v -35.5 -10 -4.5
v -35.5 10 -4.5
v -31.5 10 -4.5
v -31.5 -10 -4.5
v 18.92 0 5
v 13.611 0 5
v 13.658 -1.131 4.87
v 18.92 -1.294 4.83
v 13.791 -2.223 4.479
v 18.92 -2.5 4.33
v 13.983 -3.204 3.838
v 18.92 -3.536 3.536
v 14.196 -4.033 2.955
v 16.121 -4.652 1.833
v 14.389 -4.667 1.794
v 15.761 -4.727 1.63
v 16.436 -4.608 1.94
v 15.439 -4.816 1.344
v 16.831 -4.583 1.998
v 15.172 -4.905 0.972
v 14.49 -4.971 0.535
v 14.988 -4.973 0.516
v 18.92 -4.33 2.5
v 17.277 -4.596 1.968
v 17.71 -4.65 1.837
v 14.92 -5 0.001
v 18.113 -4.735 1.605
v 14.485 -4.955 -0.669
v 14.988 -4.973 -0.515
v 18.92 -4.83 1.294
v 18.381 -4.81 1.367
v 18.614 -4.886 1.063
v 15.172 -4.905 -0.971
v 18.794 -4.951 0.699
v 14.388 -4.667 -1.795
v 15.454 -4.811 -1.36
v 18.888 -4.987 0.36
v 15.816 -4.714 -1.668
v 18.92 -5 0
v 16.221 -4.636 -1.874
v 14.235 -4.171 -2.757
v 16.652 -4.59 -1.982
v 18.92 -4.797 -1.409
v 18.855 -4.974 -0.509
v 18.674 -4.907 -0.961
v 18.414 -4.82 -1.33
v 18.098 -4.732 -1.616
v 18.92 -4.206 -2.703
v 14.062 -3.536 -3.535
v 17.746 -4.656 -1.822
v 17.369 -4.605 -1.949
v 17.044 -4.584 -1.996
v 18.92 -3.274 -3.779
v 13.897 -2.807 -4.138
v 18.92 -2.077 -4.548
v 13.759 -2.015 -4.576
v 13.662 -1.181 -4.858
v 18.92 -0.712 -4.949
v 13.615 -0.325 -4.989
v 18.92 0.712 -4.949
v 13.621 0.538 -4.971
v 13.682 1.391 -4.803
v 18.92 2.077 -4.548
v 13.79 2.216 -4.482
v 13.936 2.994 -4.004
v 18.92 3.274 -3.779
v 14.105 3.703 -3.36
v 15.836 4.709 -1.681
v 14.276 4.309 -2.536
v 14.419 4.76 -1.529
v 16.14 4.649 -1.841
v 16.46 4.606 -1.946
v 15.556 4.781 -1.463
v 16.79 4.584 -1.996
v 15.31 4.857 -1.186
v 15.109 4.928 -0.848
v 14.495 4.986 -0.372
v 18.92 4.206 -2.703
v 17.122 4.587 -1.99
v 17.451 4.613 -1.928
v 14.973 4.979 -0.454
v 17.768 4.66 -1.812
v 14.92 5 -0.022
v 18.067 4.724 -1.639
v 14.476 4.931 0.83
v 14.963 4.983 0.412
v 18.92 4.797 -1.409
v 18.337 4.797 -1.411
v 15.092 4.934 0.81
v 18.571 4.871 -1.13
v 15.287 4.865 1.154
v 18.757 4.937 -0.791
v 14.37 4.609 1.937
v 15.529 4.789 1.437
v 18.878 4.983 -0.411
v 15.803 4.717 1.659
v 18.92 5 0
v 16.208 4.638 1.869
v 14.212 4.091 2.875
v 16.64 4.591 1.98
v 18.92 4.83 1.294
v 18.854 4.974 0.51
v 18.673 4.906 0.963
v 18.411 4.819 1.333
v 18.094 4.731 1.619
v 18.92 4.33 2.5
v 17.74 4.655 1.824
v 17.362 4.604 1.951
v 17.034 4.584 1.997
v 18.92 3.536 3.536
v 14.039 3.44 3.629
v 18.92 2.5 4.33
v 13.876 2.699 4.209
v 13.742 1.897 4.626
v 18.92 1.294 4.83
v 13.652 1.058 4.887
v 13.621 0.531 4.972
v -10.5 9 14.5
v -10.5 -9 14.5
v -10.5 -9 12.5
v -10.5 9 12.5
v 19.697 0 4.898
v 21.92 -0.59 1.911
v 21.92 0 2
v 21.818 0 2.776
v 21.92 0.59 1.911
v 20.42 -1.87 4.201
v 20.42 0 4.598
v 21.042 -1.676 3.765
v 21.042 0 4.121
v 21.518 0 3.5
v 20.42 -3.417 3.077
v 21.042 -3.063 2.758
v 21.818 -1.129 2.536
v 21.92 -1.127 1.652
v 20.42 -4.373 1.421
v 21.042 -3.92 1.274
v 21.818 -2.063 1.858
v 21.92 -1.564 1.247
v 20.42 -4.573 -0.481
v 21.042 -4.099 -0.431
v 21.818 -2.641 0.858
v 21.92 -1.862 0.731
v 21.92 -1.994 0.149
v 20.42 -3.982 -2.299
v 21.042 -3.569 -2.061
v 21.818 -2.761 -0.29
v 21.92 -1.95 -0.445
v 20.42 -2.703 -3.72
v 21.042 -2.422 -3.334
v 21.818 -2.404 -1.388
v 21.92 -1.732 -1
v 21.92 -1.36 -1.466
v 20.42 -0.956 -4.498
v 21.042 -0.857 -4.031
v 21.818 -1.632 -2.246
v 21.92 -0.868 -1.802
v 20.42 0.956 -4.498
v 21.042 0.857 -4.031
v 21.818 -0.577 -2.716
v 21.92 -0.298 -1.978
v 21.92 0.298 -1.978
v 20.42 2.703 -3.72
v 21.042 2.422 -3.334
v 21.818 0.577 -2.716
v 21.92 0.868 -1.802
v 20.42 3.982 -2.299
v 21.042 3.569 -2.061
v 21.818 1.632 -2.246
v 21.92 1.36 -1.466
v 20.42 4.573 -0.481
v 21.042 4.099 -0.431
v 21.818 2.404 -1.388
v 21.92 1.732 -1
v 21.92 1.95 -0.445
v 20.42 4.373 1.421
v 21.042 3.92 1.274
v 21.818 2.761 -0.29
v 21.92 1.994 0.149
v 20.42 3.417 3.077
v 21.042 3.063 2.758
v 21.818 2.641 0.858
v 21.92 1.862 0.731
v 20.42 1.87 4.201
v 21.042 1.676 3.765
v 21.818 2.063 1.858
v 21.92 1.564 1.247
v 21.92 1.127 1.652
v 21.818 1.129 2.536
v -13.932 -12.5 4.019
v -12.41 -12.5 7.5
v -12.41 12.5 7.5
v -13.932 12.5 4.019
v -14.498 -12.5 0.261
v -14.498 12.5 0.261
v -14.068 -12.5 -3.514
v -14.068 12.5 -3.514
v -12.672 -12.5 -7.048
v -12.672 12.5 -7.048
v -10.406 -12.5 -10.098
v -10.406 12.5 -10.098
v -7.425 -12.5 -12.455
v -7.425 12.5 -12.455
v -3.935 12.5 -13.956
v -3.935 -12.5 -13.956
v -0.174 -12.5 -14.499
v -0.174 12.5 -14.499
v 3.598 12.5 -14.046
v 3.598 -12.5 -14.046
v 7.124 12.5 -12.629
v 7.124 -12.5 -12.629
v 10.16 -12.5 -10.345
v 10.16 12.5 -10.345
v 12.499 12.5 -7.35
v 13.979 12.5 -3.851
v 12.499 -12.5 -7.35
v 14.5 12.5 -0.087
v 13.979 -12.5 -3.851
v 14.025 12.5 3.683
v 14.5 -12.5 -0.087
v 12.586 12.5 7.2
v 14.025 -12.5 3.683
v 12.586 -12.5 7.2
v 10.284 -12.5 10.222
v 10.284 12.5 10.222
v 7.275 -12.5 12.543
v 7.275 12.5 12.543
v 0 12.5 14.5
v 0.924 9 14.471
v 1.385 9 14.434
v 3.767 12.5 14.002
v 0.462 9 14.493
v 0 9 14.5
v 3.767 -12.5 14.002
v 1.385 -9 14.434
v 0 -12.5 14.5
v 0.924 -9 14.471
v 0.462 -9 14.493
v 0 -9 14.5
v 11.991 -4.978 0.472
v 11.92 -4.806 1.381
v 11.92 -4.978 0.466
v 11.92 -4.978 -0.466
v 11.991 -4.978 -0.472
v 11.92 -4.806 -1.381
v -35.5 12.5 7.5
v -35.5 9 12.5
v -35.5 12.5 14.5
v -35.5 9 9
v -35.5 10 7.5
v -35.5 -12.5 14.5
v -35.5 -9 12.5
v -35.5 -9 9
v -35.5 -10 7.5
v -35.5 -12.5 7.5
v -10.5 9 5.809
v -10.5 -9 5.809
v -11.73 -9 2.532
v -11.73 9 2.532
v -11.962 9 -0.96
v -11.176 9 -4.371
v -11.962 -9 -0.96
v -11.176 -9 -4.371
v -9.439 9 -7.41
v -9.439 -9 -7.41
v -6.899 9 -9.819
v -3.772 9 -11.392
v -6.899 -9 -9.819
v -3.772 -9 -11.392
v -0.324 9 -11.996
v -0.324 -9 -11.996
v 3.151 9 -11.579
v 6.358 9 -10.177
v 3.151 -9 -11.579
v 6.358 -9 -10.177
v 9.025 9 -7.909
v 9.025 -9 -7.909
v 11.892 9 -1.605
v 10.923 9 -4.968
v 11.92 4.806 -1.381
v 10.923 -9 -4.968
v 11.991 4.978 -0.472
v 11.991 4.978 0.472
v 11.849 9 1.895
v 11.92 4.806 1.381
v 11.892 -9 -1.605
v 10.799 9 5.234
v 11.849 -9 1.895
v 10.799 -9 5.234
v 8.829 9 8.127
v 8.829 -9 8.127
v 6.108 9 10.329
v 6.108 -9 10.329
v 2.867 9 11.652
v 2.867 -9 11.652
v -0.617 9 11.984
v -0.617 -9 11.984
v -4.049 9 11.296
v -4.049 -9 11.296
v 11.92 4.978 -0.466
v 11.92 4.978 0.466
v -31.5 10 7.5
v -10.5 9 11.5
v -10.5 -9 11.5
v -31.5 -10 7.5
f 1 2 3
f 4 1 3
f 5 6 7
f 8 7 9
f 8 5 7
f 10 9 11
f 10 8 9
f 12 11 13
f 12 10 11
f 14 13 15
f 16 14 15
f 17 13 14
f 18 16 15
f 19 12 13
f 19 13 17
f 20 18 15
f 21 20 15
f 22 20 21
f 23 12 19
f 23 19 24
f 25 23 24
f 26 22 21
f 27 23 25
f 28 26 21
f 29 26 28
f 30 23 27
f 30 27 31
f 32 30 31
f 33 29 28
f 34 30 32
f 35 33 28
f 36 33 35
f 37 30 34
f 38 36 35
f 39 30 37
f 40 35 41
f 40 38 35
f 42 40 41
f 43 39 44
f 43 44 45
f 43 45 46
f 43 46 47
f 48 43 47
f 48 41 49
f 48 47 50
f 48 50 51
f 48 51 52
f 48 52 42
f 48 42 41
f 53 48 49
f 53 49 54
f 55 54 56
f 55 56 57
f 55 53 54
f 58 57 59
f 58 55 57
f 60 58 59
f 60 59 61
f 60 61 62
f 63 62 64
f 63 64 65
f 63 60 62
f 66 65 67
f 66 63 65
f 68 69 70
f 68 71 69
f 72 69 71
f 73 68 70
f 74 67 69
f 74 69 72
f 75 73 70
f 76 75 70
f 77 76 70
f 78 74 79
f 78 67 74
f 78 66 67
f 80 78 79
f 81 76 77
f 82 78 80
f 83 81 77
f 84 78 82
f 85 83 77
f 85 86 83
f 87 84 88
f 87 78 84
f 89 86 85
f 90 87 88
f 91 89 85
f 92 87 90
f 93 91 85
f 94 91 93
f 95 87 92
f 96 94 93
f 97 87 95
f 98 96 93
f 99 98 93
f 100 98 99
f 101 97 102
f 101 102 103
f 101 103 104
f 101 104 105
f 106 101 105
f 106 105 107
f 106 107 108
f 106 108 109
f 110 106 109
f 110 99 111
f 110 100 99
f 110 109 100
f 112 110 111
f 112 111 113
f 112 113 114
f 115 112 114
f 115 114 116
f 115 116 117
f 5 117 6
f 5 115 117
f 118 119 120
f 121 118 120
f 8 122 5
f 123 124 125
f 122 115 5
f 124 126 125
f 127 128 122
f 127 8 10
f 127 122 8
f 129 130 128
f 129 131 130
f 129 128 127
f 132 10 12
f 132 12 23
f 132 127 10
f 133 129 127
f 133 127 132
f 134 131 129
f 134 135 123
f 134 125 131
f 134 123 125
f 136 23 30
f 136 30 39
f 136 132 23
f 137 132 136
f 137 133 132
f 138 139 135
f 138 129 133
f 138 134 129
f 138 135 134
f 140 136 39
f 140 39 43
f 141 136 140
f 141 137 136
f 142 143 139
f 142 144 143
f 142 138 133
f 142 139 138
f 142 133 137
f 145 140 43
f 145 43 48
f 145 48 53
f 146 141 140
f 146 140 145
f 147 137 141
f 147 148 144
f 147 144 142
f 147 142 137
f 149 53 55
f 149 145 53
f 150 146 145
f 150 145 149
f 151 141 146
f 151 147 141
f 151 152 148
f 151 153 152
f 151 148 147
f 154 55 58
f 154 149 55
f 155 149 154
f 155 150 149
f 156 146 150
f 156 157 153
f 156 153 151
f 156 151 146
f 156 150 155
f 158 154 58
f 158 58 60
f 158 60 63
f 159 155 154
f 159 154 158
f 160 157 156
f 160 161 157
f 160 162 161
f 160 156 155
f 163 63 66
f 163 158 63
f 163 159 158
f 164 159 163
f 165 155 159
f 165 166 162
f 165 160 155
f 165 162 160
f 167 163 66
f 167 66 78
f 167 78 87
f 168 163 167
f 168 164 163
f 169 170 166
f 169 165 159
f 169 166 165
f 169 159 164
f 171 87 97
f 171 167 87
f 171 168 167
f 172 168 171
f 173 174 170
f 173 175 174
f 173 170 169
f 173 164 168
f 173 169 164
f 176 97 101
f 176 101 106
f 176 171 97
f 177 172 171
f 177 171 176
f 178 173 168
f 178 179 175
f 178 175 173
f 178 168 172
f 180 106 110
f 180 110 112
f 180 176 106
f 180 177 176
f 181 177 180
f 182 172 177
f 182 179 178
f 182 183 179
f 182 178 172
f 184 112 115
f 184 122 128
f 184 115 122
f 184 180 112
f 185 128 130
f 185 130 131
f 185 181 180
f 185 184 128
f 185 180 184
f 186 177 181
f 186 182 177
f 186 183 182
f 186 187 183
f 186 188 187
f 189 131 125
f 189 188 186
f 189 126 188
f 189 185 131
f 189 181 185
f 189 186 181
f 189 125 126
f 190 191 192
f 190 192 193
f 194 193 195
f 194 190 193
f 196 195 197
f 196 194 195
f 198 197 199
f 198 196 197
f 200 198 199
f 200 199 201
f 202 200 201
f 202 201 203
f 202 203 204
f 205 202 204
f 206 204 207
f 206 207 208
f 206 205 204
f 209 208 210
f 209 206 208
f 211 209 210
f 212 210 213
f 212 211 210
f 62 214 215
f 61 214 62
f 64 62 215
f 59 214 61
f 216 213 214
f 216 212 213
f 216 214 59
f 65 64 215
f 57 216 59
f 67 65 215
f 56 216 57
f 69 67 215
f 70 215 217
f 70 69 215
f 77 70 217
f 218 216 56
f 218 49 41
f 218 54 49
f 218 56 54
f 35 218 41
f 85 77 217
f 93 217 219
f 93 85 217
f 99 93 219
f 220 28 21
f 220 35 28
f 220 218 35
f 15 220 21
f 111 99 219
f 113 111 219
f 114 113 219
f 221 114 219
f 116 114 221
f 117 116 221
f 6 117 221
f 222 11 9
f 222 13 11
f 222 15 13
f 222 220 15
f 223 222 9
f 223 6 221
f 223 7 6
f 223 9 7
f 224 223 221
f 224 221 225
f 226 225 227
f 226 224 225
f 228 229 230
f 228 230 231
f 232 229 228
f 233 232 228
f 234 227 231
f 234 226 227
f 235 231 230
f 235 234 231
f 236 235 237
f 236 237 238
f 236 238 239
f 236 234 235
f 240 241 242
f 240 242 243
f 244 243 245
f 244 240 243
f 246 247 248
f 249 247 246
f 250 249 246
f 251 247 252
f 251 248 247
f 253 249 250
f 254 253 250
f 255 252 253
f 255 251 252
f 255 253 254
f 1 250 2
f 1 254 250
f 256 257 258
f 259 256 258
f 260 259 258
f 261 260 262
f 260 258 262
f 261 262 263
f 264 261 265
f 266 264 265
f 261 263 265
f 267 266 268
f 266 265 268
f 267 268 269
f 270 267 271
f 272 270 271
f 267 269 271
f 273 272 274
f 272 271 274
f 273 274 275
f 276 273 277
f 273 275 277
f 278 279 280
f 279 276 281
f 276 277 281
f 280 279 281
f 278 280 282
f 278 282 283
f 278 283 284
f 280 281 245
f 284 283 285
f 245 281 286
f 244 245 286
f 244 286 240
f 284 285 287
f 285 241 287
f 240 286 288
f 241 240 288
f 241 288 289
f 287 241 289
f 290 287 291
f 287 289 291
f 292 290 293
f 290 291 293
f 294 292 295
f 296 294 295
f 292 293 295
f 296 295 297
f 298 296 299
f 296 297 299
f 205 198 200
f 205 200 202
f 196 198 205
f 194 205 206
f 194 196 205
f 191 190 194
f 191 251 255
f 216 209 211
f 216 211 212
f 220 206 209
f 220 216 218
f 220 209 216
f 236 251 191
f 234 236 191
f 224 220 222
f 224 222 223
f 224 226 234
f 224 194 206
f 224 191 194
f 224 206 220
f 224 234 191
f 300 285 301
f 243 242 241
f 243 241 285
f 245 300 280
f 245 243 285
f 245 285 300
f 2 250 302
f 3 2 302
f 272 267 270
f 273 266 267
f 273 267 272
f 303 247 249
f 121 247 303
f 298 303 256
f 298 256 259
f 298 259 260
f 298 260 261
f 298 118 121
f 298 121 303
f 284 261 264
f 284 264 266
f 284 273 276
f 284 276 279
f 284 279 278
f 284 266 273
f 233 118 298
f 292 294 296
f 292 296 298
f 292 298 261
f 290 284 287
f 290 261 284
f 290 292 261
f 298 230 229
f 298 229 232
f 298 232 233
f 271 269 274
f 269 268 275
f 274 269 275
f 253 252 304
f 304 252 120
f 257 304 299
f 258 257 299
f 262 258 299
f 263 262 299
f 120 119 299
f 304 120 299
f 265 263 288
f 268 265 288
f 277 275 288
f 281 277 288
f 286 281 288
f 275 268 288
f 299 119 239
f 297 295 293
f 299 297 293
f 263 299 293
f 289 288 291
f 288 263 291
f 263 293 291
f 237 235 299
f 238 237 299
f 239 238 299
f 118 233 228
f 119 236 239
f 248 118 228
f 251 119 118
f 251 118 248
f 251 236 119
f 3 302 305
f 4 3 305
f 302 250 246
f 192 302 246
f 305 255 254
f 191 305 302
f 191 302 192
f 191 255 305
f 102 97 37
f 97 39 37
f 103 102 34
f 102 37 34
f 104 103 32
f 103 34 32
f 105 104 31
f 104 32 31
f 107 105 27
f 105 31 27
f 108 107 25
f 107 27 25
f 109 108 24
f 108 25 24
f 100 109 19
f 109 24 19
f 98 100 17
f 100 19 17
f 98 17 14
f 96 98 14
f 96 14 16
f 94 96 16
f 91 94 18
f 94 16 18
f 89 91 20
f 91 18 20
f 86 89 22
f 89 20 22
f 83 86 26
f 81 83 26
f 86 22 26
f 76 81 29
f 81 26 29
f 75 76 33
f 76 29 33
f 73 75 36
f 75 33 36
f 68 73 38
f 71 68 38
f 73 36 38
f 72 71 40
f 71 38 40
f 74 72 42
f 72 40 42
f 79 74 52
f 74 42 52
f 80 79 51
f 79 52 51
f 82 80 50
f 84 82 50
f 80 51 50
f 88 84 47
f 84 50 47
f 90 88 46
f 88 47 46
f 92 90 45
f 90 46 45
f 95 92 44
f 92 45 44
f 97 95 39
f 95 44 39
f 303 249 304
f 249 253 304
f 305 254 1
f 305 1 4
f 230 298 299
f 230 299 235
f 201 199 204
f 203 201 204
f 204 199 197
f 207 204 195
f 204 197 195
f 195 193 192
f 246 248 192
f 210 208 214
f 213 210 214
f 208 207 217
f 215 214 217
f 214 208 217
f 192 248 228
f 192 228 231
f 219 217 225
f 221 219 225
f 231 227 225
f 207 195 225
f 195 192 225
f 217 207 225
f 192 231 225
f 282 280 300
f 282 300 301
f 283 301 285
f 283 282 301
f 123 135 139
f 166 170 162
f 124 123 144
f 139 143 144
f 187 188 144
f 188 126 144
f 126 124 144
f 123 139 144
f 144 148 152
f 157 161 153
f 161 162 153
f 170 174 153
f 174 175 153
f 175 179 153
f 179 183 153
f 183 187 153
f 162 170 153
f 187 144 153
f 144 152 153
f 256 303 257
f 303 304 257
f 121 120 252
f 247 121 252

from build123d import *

# Parameters (mm, degrees)
F1_DEPTH  = 12.5
F3_DEPTH  = 9
F4_W      = 10
F4_H      = 5
F6_R      = 3
F7_R      = 2
F8_DEPTH  = 5
F9_W      = 4
F9_H      = 20
F10_DEPTH = 12
F11_DEPTH = 0.7


with BuildPart() as f1:
    # F0 (on Front) → F1 (new body, symmetric)
    with BuildSketch(Plane.XZ):
        with BuildLine():
            Line((-35.5, 7.5), (-12.409673646, 7.5))
            ThreePointArc((-12.409673646, 7.5), (7.1239034244, -12.6293309403), (0, 14.5))
            Line((0, 14.5), (-35.5, 14.5))
            Line((-35.5, 14.5), (-35.5, 7.5))
        make_face()
    extrude(amount=F1_DEPTH, both=True)

    # F2 (on Front) → F3 (cut, symmetric)
    with BuildSketch(Plane.XZ):
        with BuildLine():
            Line((-10.5, 11.5), (-10.5, 5.8094750193))
            ThreePointArc((-10.5, 5.8094750193), (7.7746445838, -9.1408370292), (-4.0490846521, 11.2962344823))
            Line((-4.0490846521, 11.2962344823), (1.5, 14.5))
            Line((1.5, 14.5), (-10.5, 14.5))
            Line((-10.5, 14.5), (-10.5, 12.5))
            Line((-10.5, 12.5), (-35.5, 12.5))
            Line((-35.5, 12.5), (-35.5, 9))
            Line((-35.5, 9), (-10.5, 11.5))
        make_face()
    extrude(amount=F3_DEPTH, both=True, mode=Mode.SUBTRACT)

    # F4 (on Front) → F5 (revolve)
    with BuildSketch(Plane.XZ):
        with Locations((16.9203263894, 2.5)):
            Rectangle(F4_W, F4_H)
    revolve(axis=Axis((16.9203263894, 0, 0), (1, 0, 0)))

    # F6
    f6_edges = [f1.edges().sort_by_distance(p)[0] for p in [
        (21.920326, 0, -5),
    ]]
    fillet(f6_edges, radius=F6_R)

    # F7 (on Front) → F8 (cut, symmetric)
    with BuildSketch(Plane.XZ):
        with Locations((16.9203263894, 0)):
            Circle(F7_R)
    extrude(amount=F8_DEPTH, both=True, mode=Mode.SUBTRACT)

    # F9 (on face) → F10 (join)
    with BuildSketch(Plane(origin=(0, 0, 7.5), x_dir=(1, 0, 0), z_dir=(0, 0, -1))):
        with Locations((-33.5, 0)):
            Rectangle(F9_W, F9_H)
    extrude(amount=F10_DEPTH)

    # F9 (on face) → F11 (join)
    with BuildSketch(Plane(origin=(0, 0, 7.5), x_dir=(1, 0, 0), z_dir=(0, 0, -1))):
        with Locations((-33.5, 0)):
            Rectangle(F9_W, F9_H)
    extrude(amount=F11_DEPTH)


solid = f1.part
